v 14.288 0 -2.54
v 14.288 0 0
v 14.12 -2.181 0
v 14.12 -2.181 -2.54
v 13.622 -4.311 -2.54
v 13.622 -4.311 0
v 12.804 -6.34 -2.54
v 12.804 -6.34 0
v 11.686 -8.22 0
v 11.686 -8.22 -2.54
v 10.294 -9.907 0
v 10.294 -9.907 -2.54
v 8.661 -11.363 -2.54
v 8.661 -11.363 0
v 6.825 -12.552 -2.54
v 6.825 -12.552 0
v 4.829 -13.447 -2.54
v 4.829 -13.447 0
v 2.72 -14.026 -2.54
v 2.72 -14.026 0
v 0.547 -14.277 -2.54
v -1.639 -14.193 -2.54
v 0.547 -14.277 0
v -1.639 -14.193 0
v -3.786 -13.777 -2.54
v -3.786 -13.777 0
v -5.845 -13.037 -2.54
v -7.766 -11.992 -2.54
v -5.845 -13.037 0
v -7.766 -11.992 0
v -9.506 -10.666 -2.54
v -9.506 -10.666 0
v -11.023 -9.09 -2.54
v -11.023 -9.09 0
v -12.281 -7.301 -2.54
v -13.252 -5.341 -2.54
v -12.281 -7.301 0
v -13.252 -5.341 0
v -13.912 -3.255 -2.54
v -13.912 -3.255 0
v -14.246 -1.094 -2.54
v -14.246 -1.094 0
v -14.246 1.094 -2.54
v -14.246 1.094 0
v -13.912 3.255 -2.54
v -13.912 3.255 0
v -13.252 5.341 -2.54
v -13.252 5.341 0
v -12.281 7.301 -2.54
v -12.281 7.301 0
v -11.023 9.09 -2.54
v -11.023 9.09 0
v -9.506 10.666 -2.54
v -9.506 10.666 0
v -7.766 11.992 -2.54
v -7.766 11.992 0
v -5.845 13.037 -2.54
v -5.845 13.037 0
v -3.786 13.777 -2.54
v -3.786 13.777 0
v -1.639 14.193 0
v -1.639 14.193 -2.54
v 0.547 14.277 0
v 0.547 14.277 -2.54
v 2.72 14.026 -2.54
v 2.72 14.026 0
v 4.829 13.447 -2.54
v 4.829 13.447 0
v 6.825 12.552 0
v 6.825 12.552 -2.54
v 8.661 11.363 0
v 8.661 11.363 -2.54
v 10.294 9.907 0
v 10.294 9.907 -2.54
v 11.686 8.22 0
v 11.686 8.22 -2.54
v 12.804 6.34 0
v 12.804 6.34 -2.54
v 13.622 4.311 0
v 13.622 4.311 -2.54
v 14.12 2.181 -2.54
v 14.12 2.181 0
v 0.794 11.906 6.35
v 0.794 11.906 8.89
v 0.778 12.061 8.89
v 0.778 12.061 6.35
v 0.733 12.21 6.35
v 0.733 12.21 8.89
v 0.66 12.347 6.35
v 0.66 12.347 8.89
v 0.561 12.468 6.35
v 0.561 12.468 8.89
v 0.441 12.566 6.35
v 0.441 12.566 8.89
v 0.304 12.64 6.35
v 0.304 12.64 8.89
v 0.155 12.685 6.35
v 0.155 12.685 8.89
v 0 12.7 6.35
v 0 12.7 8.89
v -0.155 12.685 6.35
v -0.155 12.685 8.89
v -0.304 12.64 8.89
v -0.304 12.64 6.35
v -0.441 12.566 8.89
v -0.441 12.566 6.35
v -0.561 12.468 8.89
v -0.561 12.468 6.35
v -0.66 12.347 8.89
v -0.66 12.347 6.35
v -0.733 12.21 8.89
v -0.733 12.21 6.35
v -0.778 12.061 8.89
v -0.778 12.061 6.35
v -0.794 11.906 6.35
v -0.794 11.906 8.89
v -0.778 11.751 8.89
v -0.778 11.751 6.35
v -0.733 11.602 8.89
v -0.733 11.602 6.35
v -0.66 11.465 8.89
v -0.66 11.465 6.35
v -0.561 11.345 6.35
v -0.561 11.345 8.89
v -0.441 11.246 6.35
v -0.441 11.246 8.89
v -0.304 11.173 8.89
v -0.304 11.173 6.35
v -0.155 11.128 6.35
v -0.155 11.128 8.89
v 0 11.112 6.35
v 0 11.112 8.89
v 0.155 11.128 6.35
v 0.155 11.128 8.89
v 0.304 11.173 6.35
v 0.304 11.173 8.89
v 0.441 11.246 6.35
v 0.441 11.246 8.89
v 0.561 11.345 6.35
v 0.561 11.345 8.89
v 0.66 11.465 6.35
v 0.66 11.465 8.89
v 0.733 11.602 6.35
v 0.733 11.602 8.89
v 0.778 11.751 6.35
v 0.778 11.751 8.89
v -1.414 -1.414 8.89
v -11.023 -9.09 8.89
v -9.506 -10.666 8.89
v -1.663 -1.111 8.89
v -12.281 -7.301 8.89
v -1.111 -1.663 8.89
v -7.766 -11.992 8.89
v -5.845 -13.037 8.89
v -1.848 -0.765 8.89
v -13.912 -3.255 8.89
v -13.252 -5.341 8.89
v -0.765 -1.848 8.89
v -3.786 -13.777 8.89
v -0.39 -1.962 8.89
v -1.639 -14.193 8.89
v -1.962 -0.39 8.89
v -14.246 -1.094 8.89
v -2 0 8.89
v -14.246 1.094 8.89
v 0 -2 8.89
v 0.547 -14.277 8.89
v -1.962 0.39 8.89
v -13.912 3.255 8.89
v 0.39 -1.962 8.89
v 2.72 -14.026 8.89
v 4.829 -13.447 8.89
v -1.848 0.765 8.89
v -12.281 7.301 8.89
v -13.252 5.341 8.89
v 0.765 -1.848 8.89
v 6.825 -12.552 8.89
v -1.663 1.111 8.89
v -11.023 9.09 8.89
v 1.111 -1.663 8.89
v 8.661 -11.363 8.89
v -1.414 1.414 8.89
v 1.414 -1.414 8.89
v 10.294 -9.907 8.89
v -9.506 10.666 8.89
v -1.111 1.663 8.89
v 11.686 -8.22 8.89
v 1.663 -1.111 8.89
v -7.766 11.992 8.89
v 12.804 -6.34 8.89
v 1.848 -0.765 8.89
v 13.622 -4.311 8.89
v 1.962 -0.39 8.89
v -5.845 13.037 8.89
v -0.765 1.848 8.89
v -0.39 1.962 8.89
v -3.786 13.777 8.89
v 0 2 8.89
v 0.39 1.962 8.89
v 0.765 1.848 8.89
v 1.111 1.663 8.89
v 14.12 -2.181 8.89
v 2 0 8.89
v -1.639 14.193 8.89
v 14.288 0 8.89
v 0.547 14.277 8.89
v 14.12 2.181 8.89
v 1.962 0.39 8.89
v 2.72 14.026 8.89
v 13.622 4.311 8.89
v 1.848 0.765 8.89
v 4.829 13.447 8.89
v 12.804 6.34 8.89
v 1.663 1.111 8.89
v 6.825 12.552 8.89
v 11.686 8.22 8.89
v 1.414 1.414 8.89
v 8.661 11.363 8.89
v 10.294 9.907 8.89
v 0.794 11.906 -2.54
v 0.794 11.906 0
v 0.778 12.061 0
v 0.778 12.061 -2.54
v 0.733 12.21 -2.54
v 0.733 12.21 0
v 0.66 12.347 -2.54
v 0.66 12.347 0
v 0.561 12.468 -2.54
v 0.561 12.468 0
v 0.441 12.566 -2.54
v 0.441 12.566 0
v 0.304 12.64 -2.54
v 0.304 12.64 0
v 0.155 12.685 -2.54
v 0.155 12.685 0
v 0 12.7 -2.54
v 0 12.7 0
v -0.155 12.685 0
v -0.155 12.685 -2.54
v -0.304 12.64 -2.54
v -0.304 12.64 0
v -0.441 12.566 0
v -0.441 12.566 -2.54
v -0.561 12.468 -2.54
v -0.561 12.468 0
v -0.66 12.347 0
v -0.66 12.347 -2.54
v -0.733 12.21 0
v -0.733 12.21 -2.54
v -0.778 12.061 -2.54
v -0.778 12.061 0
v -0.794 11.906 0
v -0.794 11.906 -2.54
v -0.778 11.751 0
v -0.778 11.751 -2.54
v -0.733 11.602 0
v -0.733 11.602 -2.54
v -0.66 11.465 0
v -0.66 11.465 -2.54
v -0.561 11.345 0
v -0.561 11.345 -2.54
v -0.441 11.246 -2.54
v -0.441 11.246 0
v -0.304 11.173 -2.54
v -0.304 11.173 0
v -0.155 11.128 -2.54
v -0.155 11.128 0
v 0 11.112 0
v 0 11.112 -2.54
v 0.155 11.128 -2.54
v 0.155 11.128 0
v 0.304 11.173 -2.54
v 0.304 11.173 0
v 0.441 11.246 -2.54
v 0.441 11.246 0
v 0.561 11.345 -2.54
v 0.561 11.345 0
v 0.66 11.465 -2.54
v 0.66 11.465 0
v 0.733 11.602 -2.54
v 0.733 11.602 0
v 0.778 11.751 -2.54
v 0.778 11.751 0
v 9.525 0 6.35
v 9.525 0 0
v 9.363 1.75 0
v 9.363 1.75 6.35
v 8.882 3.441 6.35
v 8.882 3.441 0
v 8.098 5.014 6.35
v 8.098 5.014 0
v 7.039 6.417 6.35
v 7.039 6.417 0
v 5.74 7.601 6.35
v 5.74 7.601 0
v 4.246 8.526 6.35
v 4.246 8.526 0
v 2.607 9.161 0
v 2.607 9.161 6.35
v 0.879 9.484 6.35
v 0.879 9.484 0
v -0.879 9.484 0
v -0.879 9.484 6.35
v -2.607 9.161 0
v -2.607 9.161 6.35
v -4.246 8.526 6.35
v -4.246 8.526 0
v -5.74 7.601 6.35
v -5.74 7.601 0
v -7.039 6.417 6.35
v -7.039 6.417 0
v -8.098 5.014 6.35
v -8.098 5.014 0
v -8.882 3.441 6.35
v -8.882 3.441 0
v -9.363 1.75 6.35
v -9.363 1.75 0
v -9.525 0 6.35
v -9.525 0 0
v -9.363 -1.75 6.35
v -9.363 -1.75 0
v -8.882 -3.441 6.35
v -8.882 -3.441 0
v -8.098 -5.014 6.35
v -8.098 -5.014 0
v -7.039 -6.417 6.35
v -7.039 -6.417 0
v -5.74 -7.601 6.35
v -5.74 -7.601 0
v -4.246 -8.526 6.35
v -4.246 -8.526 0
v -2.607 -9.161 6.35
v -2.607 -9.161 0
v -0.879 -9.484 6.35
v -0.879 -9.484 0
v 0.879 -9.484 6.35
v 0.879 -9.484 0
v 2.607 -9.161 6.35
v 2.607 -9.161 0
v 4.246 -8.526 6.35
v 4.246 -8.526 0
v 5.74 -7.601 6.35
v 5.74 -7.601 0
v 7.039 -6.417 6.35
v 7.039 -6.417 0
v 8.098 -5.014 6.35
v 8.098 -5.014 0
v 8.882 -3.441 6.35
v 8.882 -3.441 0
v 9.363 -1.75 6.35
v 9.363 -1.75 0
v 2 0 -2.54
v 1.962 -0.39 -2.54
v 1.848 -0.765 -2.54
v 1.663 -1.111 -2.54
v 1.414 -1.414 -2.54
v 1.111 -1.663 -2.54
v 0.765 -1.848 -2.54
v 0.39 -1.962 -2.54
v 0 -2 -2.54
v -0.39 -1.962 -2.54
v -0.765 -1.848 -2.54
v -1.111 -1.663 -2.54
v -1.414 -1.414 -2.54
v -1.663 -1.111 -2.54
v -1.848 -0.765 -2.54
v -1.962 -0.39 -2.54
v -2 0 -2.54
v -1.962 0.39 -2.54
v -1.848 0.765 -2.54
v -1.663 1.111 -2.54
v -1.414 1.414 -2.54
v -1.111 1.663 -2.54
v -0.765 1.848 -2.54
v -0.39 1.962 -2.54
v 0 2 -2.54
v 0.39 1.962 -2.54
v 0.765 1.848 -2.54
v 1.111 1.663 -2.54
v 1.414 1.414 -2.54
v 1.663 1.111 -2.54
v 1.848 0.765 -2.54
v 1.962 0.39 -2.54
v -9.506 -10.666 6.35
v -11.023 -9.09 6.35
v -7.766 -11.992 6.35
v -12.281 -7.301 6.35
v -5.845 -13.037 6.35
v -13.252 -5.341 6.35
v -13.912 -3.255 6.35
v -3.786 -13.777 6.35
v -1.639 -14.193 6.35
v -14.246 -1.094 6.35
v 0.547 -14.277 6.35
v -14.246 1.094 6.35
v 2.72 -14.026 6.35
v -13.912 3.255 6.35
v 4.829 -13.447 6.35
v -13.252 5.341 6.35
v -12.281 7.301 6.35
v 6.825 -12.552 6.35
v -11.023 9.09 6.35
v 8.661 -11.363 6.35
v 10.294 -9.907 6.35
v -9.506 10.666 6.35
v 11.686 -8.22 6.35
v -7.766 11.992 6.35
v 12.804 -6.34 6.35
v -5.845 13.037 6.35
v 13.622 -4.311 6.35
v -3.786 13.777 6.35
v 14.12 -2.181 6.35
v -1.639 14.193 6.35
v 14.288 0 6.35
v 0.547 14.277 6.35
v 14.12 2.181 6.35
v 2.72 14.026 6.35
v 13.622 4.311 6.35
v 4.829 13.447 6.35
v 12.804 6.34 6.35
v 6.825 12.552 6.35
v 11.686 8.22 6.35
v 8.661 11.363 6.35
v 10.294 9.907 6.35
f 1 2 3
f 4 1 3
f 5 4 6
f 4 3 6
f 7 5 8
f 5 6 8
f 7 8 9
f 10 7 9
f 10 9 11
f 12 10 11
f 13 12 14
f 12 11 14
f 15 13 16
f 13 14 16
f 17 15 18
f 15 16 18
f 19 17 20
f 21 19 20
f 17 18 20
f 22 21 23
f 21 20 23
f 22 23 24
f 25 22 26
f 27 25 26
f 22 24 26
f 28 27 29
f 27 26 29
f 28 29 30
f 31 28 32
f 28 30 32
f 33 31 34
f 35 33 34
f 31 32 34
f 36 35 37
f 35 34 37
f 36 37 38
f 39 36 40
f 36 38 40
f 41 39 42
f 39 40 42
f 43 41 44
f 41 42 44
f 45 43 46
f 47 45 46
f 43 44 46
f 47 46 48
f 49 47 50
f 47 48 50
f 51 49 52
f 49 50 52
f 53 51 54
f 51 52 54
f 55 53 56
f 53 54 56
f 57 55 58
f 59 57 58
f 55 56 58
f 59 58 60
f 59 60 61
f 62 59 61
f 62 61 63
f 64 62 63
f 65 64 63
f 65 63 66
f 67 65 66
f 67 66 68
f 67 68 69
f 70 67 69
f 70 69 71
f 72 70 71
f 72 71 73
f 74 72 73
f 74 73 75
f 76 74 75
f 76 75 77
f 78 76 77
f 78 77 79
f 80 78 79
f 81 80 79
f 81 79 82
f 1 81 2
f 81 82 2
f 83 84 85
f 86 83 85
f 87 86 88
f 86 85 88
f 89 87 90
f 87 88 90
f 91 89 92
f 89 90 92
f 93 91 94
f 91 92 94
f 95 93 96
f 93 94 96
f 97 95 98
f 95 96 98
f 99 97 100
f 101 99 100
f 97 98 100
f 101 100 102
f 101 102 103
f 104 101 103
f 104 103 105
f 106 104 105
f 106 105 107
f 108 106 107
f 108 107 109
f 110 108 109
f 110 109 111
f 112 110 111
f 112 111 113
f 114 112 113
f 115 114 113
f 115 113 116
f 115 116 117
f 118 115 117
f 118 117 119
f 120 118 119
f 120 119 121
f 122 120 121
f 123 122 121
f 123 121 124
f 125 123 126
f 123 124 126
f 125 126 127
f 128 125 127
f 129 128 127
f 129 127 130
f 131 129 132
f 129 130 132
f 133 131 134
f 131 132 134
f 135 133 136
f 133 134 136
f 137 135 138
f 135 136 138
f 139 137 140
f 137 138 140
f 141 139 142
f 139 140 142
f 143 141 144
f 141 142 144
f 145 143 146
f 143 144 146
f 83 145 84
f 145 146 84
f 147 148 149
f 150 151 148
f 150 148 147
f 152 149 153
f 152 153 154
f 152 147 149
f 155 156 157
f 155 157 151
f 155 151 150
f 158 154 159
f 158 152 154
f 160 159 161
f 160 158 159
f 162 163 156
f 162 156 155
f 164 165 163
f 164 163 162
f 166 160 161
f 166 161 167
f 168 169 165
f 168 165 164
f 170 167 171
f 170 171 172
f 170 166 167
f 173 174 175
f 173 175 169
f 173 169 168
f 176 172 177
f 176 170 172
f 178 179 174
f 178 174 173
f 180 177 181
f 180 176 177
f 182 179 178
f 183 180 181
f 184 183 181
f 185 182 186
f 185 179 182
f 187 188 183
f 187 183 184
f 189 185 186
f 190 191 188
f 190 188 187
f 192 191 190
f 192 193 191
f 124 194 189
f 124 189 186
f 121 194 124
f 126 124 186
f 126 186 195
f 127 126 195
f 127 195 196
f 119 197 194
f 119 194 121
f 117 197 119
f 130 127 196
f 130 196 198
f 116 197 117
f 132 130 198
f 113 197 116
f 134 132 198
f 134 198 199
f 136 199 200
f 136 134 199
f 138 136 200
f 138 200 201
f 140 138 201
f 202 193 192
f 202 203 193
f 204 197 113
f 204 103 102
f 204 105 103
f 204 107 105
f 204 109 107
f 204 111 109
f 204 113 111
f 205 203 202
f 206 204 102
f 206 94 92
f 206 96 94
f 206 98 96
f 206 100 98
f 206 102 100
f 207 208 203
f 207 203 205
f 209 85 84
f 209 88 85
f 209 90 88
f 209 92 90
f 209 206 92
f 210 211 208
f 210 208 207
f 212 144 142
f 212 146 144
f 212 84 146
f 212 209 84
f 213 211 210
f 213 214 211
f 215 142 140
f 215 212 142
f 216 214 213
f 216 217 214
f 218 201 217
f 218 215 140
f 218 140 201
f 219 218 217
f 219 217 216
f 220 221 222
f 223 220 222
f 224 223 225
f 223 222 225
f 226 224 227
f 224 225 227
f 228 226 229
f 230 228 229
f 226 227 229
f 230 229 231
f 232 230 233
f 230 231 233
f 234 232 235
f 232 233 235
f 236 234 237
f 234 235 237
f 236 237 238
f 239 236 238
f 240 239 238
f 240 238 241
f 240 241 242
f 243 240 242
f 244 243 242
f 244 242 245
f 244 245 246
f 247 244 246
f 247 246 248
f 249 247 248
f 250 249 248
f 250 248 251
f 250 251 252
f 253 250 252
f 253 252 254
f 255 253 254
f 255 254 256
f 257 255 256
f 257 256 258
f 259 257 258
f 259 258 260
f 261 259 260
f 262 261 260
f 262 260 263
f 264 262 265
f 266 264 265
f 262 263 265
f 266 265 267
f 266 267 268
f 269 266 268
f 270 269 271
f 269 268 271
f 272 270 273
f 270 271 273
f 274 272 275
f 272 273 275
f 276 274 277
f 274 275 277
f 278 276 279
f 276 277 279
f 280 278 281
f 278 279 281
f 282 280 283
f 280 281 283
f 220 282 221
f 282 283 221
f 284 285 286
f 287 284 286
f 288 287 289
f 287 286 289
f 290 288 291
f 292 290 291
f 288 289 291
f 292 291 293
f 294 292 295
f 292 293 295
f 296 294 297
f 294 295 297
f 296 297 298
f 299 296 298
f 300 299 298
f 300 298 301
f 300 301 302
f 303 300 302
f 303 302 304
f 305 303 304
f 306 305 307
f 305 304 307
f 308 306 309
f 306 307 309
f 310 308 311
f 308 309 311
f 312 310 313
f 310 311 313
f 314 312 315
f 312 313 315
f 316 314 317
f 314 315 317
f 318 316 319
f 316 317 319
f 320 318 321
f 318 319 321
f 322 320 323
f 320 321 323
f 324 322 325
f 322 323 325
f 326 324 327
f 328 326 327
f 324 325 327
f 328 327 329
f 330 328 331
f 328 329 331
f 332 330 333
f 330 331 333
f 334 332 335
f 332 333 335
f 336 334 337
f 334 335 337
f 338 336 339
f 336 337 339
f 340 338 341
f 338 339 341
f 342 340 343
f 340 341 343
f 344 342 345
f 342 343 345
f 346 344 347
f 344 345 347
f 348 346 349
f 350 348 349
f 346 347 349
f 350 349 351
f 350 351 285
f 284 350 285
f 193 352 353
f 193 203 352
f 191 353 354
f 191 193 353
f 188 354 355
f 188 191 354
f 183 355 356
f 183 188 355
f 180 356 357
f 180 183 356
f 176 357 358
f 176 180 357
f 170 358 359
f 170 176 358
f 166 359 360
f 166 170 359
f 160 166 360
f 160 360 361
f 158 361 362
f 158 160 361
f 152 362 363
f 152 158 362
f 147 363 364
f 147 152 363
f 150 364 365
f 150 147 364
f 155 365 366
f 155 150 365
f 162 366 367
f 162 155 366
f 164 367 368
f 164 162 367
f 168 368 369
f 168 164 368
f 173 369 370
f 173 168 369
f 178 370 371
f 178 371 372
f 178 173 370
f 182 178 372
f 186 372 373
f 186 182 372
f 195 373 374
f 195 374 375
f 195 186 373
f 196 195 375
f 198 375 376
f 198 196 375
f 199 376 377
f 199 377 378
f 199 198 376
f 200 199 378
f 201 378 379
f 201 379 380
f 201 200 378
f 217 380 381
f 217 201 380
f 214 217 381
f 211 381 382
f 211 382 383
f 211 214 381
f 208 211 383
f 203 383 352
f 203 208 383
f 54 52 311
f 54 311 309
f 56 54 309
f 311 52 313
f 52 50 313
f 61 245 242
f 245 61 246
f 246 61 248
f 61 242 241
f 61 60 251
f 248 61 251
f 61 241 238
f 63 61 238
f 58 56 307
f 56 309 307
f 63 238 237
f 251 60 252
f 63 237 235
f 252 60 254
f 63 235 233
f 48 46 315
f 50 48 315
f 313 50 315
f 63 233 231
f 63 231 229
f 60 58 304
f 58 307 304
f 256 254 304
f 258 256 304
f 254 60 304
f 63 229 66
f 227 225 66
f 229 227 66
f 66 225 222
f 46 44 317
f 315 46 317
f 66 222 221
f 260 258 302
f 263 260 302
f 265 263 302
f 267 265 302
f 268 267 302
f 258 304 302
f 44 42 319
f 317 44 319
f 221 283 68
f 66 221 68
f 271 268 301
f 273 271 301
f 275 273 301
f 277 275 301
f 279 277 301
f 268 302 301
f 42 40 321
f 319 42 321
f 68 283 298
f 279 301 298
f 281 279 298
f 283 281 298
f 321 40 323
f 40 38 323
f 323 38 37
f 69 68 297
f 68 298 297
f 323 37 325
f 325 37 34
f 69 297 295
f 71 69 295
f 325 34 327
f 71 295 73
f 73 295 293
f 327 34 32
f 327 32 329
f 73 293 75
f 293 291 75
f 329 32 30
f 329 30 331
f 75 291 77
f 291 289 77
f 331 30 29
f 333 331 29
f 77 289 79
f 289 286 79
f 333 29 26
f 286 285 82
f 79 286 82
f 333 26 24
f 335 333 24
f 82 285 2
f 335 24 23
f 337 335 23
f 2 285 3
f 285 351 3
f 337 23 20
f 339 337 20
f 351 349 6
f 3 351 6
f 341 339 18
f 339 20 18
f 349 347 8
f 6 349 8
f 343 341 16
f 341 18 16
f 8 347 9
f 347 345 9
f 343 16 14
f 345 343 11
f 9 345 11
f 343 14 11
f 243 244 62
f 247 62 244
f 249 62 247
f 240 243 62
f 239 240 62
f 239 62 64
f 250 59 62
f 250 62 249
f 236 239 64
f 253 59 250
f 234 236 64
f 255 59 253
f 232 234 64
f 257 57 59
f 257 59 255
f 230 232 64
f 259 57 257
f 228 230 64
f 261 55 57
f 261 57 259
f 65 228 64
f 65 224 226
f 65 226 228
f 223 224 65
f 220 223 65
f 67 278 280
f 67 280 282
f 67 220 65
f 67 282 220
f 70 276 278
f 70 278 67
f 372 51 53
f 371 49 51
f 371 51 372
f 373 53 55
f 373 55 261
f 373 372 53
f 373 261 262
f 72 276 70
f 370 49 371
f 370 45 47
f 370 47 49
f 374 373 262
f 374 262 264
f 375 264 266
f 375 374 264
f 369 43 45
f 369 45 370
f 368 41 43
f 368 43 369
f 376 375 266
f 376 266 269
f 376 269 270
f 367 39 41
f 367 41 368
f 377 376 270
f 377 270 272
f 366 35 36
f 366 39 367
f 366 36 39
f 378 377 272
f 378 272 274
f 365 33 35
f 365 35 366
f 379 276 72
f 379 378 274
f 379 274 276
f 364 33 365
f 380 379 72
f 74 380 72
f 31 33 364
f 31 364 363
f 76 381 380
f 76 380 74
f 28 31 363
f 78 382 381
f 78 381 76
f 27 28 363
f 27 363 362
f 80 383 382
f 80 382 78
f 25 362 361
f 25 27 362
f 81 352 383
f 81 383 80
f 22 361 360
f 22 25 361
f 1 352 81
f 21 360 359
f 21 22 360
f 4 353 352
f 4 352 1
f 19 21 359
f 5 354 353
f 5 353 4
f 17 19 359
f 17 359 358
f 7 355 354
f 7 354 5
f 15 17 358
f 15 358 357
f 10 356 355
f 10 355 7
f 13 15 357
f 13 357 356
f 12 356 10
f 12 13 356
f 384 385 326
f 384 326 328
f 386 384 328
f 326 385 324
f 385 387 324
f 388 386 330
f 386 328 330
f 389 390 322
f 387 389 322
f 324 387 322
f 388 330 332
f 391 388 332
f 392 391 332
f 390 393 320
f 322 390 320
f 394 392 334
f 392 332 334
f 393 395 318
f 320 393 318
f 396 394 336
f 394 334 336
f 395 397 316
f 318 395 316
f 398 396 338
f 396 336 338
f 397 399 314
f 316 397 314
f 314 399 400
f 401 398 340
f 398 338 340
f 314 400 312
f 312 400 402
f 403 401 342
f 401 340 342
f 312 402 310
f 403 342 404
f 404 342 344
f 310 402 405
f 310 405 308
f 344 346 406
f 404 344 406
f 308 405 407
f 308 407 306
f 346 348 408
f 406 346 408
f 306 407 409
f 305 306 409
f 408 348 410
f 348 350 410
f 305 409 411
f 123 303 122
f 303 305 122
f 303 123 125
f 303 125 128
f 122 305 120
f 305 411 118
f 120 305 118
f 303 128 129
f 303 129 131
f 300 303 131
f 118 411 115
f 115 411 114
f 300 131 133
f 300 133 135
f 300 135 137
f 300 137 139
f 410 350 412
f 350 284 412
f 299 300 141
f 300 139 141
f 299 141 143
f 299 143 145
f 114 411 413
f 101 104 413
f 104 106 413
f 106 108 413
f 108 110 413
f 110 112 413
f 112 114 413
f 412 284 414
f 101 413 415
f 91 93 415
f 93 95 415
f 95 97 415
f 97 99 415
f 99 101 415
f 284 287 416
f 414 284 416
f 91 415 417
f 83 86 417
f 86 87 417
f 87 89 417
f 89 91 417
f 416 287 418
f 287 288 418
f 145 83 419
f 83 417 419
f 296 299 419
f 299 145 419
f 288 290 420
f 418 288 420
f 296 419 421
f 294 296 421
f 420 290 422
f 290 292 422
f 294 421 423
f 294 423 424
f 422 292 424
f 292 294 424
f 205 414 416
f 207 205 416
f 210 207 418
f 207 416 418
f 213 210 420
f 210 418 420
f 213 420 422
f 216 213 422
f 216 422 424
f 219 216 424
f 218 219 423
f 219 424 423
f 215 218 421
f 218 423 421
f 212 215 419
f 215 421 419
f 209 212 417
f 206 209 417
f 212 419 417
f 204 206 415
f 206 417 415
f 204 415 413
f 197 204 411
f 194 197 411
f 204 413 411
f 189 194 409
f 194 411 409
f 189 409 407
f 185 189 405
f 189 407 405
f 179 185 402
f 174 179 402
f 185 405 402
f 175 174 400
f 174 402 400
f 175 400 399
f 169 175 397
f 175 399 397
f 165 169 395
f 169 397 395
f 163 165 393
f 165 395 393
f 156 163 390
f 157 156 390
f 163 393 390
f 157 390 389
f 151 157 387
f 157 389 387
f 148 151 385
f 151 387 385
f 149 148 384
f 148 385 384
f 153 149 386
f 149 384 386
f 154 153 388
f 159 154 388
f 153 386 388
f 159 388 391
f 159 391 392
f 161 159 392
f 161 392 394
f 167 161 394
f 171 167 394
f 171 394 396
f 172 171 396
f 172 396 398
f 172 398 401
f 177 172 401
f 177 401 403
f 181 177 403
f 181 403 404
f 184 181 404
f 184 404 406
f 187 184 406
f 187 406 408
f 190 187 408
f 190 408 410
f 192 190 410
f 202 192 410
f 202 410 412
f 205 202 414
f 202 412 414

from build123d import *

# Parameters (mm, degrees)
SKETCH1_R           = 9.525
BOSS_EXTRUDE1_DEPTH = 6.35
SKETCH2_R           = 2
CUT_EXTRUDE1_DEPTH  = 15.892070037
SKETCH5_R           = 14.2875
SKETCH5_R_2         = 2
BOSS_EXTRUDE3_DEPTH = 2.54
SKETCH6_R           = 14.2875
SKETCH6_R_2         = 2
BOSS_EXTRUDE4_DEPTH = 2.54
SKETCH7_R           = 0.79375
CUT_EXTRUDE2_DEPTH  = 24.214439741


with BuildPart() as part:
    # Sketch1 → Boss-Extrude1 (new body)
    with BuildSketch(Plane.XY):
        Circle(SKETCH1_R)
    extrude(amount=BOSS_EXTRUDE1_DEPTH)

    # Sketch2 → Cut-Extrude1 (cut, through all)
    with BuildSketch(Plane.XY.offset(6.35)):
        Circle(SKETCH2_R)
    extrude(amount=-CUT_EXTRUDE1_DEPTH, mode=Mode.SUBTRACT)

    # Sketch5 → Boss-Extrude3 (add)
    with BuildSketch(Plane.XY.offset(6.35)):
        Circle(SKETCH5_R)
        Circle(SKETCH5_R_2, mode=Mode.SUBTRACT)
    extrude(amount=BOSS_EXTRUDE3_DEPTH)

    # Sketch6 → Boss-Extrude4 (add)
    with BuildSketch(Plane(origin=(0, 0, 0), x_dir=(-1, 0, 0), z_dir=(0, 0, -1))):
        with Locations(Location((0, 0, 0), (0, 0, 180))):
            Circle(SKETCH6_R)
        with Locations(Location((0, 0, 0), (0, 0, 180))):
            Circle(SKETCH6_R_2, mode=Mode.SUBTRACT)
    extrude(amount=BOSS_EXTRUDE4_DEPTH)

    # Sketch7 → Cut-Extrude2 (cut, through all)
    with BuildSketch(Plane.XY.offset(8.89)):
        with Locations((0, 11.90625)):
            Circle(SKETCH7_R)
    extrude(amount=-CUT_EXTRUDE2_DEPTH, mode=Mode.SUBTRACT)


solid = part.part
